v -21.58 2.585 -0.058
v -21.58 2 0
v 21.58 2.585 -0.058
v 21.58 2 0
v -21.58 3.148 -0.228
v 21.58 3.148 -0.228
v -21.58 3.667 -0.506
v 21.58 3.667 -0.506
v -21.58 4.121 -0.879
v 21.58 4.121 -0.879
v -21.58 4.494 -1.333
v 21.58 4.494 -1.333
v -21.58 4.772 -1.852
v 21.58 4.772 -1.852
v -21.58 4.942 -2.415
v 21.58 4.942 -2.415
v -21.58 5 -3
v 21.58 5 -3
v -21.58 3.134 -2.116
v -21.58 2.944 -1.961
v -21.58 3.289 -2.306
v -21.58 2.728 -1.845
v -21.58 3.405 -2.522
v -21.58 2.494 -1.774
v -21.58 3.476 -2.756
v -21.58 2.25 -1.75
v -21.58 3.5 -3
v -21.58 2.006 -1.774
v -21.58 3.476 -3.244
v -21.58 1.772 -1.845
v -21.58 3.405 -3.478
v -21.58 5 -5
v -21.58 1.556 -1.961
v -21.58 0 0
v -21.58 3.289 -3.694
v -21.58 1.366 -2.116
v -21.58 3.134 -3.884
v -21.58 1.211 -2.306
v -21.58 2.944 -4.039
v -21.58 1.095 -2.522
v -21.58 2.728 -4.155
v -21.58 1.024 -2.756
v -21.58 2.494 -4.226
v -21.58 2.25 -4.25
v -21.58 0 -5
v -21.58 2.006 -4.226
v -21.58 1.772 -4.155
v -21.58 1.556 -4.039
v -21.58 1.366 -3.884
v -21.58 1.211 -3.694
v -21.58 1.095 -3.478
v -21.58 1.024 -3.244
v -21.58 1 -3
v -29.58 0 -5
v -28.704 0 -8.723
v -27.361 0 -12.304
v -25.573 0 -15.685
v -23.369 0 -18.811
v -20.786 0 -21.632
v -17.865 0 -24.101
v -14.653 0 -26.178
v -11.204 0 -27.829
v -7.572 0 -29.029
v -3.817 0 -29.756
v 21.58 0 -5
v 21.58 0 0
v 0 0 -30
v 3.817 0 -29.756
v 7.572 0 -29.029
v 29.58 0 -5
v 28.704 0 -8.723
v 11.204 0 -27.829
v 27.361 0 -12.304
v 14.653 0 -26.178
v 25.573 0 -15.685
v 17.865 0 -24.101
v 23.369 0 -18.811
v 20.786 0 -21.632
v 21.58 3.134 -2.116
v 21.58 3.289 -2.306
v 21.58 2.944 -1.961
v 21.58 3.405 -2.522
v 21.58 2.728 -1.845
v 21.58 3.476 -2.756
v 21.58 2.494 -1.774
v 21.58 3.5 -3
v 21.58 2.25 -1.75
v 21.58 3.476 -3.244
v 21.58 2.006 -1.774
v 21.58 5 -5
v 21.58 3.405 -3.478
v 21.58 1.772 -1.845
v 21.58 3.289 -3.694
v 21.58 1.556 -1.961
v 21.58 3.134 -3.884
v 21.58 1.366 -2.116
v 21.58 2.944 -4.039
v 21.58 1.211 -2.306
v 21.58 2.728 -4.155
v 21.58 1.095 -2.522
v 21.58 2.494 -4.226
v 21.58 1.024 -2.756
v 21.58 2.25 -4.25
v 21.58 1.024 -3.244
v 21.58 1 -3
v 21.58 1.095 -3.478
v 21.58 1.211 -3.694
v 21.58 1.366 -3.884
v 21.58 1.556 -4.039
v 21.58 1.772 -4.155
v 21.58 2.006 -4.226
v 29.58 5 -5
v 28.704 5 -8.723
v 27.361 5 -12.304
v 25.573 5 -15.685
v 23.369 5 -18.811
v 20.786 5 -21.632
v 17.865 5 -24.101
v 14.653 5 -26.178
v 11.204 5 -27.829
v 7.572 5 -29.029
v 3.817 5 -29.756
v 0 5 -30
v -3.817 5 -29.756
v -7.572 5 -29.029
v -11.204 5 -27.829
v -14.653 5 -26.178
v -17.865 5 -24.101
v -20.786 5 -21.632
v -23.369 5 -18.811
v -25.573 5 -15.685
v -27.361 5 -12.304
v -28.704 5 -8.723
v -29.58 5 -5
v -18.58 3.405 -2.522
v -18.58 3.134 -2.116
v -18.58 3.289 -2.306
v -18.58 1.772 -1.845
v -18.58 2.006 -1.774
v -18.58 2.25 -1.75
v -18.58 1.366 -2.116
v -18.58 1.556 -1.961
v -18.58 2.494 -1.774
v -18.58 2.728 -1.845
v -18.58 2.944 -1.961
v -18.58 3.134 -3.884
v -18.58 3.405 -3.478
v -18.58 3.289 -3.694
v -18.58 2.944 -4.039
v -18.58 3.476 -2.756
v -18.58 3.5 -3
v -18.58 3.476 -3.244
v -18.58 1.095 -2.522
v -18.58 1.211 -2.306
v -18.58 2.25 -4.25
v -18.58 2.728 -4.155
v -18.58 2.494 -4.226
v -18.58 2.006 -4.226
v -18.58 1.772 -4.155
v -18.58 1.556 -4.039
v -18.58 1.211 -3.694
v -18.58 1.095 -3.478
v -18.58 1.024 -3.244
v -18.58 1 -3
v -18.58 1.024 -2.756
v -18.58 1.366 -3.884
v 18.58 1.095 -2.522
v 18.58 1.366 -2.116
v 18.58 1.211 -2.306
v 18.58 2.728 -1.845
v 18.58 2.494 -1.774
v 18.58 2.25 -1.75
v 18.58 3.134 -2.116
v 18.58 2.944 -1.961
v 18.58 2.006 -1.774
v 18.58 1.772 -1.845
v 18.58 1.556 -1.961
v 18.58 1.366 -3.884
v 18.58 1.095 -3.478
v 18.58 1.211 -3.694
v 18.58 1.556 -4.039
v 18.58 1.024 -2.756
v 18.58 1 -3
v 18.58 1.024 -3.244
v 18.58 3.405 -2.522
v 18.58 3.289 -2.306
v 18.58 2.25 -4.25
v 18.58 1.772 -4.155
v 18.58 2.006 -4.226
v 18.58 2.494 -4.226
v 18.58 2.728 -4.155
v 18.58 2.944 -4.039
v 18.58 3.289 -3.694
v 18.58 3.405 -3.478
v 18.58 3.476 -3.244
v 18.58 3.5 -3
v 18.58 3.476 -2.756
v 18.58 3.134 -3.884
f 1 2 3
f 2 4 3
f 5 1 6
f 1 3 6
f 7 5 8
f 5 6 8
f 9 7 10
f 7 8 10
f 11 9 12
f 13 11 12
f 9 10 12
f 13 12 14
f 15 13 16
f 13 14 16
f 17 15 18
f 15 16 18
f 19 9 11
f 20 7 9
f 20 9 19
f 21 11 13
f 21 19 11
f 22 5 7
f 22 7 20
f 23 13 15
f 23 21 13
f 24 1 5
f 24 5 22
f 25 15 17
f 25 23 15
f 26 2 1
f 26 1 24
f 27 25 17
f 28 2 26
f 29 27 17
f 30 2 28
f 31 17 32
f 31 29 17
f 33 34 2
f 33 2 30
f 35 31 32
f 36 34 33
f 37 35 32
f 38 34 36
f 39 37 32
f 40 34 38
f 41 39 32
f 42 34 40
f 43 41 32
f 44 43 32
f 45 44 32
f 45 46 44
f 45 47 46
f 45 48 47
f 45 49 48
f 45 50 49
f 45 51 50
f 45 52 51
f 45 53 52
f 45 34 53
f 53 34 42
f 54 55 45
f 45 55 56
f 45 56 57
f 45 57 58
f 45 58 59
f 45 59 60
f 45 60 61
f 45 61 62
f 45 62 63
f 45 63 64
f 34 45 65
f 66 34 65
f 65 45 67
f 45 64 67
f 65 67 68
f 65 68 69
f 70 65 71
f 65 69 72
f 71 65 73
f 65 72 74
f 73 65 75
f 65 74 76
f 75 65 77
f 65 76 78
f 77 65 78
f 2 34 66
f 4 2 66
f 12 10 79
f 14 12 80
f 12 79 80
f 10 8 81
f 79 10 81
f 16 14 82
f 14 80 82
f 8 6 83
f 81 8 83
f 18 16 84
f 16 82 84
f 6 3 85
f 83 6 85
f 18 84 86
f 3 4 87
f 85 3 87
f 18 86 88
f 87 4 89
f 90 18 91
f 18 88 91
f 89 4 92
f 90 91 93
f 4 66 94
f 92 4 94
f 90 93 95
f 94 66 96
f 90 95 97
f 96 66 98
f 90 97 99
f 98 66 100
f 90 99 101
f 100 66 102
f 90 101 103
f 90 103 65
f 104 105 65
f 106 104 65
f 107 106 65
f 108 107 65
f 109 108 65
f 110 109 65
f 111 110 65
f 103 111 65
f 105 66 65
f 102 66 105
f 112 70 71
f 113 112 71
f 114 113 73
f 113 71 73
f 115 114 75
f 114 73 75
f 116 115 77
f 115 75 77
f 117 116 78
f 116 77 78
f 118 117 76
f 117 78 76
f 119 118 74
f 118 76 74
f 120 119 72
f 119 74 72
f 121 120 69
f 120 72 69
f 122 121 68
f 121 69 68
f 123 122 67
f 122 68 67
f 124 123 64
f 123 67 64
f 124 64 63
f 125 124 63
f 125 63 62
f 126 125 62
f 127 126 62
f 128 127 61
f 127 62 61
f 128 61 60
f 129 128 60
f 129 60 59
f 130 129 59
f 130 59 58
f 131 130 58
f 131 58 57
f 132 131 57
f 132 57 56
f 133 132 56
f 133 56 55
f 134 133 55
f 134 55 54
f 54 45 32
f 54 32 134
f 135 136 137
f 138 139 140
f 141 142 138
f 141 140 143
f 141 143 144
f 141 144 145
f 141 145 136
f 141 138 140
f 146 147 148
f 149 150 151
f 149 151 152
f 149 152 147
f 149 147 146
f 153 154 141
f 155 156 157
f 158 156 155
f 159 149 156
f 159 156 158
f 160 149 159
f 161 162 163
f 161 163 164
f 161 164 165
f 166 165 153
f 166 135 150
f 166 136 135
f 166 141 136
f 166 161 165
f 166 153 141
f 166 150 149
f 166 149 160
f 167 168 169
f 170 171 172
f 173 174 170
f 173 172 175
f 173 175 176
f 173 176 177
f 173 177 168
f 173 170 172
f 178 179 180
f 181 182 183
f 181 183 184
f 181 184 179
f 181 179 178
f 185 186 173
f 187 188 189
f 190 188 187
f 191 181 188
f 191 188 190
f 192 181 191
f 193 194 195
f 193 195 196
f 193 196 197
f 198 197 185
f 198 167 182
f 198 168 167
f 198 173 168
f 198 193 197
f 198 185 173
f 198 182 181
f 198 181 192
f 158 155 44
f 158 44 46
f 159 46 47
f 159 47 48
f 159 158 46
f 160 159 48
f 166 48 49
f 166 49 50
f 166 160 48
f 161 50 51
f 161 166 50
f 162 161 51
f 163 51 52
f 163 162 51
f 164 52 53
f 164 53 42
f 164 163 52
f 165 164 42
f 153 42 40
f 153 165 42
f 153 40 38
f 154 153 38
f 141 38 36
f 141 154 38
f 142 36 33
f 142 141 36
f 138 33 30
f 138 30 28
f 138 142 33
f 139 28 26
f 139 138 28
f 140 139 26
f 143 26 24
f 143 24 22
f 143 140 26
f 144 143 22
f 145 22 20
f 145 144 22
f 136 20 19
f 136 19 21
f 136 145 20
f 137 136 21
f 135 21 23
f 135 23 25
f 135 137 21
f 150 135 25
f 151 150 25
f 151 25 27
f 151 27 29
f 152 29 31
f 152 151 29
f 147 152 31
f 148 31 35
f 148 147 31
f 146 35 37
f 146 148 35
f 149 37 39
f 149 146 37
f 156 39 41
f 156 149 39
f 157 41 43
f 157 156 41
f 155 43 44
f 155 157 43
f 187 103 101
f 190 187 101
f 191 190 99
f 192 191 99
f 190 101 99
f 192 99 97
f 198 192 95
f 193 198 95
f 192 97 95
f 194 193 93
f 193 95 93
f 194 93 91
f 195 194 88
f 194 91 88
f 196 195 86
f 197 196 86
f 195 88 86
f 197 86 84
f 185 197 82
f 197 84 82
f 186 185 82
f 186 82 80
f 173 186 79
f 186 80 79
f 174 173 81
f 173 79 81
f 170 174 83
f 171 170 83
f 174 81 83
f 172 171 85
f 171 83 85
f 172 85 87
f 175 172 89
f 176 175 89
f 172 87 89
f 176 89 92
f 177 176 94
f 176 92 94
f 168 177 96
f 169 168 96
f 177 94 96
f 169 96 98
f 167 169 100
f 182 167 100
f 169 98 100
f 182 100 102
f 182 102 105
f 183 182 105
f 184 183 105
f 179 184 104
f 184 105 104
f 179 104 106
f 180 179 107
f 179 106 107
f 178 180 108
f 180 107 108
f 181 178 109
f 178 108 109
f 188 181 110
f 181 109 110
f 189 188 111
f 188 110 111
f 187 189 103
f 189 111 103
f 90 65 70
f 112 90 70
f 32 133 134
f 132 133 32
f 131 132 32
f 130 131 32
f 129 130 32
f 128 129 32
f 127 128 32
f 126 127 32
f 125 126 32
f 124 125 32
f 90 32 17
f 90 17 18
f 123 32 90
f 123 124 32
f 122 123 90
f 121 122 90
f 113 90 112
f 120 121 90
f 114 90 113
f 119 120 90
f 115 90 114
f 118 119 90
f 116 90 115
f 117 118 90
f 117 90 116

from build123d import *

# Parameters (mm, degrees)
BOSS_EXTRUDE1_DEPTH = 5
CUT_EXTRUDE1_START  = -10
CUT_EXTRUDE1_DEPTH  = 10
FILLET2_R           = 3
SKETCH6_R           = 1.25
CUT_EXTRUDE2_DEPTH  = 3
CUT_EXTRUDE3_START  = -3
SKETCH7_R           = 1.25
CUT_EXTRUDE3_DEPTH  = 3


with BuildPart() as part:
    # Sketch1 → Boss-Extrude1 (new body)
    with BuildSketch(Plane(origin=(0, 0, 0), x_dir=(1, 0, 0), z_dir=(0, 1, 0))):
        with BuildLine():
            Line((-30, 0), (30, 0))
            ThreePointArc((30, 0), (0, 30), (-30, 0))
        make_face()
    extrude(amount=BOSS_EXTRUDE1_DEPTH)

    # Sketch5 → Cut-Extrude1 (cut)
    with BuildSketch(Plane(origin=(0, 5, 0), x_dir=(1, 0, 0), z_dir=(0, 1, 0)).offset(CUT_EXTRUDE1_START)):
        with BuildLine():
            Line((-21.580398915, 0), (-21.580398915, 5))
            Line((-21.580398915, 5), (-29.580398915, 5))
            ThreePointArc((-29.580398915, 5), (-29.894915684, 2.508787808), (-30, 0))
            Line((-30, 0), (-21.580398915, 0))
        make_face()
        with BuildLine():
            Line((21.580398915, 5), (29.580398915, 5))
            ThreePointArc((29.580398915, 5), (29.894915684, 2.508787808), (30, 0))
            Line((30, 0), (21.580398915, 0))
            Line((21.580398915, 0), (21.580398915, 5))
        make_face()
    extrude(amount=CUT_EXTRUDE1_DEPTH, mode=Mode.SUBTRACT)

    # Fillet2
    fillet2_edges = [part.edges().sort_by_distance(p)[0] for p in [
        (0, 5, 0),
    ]]
    fillet(fillet2_edges, radius=FILLET2_R)

    # Sketch6 → Cut-Extrude2 (cut)
    with BuildSketch(Plane(origin=(21.580398915, 0, 0), x_dir=(0, 0, -1), z_dir=(1, 0, 0))):
        with Locations((3, 2.25)):
            Circle(SKETCH6_R)
    extrude(amount=-CUT_EXTRUDE2_DEPTH, mode=Mode.SUBTRACT)

    # Sketch7 → Cut-Extrude3 (cut)
    with BuildSketch(Plane.ZY.offset(21.580398915).offset(CUT_EXTRUDE3_START)):
        with Locations(Location((-3, 2.25, 0), (0, 0, 180))):
            Circle(SKETCH7_R)
    extrude(amount=CUT_EXTRUDE3_DEPTH, mode=Mode.SUBTRACT)


solid = part.part
